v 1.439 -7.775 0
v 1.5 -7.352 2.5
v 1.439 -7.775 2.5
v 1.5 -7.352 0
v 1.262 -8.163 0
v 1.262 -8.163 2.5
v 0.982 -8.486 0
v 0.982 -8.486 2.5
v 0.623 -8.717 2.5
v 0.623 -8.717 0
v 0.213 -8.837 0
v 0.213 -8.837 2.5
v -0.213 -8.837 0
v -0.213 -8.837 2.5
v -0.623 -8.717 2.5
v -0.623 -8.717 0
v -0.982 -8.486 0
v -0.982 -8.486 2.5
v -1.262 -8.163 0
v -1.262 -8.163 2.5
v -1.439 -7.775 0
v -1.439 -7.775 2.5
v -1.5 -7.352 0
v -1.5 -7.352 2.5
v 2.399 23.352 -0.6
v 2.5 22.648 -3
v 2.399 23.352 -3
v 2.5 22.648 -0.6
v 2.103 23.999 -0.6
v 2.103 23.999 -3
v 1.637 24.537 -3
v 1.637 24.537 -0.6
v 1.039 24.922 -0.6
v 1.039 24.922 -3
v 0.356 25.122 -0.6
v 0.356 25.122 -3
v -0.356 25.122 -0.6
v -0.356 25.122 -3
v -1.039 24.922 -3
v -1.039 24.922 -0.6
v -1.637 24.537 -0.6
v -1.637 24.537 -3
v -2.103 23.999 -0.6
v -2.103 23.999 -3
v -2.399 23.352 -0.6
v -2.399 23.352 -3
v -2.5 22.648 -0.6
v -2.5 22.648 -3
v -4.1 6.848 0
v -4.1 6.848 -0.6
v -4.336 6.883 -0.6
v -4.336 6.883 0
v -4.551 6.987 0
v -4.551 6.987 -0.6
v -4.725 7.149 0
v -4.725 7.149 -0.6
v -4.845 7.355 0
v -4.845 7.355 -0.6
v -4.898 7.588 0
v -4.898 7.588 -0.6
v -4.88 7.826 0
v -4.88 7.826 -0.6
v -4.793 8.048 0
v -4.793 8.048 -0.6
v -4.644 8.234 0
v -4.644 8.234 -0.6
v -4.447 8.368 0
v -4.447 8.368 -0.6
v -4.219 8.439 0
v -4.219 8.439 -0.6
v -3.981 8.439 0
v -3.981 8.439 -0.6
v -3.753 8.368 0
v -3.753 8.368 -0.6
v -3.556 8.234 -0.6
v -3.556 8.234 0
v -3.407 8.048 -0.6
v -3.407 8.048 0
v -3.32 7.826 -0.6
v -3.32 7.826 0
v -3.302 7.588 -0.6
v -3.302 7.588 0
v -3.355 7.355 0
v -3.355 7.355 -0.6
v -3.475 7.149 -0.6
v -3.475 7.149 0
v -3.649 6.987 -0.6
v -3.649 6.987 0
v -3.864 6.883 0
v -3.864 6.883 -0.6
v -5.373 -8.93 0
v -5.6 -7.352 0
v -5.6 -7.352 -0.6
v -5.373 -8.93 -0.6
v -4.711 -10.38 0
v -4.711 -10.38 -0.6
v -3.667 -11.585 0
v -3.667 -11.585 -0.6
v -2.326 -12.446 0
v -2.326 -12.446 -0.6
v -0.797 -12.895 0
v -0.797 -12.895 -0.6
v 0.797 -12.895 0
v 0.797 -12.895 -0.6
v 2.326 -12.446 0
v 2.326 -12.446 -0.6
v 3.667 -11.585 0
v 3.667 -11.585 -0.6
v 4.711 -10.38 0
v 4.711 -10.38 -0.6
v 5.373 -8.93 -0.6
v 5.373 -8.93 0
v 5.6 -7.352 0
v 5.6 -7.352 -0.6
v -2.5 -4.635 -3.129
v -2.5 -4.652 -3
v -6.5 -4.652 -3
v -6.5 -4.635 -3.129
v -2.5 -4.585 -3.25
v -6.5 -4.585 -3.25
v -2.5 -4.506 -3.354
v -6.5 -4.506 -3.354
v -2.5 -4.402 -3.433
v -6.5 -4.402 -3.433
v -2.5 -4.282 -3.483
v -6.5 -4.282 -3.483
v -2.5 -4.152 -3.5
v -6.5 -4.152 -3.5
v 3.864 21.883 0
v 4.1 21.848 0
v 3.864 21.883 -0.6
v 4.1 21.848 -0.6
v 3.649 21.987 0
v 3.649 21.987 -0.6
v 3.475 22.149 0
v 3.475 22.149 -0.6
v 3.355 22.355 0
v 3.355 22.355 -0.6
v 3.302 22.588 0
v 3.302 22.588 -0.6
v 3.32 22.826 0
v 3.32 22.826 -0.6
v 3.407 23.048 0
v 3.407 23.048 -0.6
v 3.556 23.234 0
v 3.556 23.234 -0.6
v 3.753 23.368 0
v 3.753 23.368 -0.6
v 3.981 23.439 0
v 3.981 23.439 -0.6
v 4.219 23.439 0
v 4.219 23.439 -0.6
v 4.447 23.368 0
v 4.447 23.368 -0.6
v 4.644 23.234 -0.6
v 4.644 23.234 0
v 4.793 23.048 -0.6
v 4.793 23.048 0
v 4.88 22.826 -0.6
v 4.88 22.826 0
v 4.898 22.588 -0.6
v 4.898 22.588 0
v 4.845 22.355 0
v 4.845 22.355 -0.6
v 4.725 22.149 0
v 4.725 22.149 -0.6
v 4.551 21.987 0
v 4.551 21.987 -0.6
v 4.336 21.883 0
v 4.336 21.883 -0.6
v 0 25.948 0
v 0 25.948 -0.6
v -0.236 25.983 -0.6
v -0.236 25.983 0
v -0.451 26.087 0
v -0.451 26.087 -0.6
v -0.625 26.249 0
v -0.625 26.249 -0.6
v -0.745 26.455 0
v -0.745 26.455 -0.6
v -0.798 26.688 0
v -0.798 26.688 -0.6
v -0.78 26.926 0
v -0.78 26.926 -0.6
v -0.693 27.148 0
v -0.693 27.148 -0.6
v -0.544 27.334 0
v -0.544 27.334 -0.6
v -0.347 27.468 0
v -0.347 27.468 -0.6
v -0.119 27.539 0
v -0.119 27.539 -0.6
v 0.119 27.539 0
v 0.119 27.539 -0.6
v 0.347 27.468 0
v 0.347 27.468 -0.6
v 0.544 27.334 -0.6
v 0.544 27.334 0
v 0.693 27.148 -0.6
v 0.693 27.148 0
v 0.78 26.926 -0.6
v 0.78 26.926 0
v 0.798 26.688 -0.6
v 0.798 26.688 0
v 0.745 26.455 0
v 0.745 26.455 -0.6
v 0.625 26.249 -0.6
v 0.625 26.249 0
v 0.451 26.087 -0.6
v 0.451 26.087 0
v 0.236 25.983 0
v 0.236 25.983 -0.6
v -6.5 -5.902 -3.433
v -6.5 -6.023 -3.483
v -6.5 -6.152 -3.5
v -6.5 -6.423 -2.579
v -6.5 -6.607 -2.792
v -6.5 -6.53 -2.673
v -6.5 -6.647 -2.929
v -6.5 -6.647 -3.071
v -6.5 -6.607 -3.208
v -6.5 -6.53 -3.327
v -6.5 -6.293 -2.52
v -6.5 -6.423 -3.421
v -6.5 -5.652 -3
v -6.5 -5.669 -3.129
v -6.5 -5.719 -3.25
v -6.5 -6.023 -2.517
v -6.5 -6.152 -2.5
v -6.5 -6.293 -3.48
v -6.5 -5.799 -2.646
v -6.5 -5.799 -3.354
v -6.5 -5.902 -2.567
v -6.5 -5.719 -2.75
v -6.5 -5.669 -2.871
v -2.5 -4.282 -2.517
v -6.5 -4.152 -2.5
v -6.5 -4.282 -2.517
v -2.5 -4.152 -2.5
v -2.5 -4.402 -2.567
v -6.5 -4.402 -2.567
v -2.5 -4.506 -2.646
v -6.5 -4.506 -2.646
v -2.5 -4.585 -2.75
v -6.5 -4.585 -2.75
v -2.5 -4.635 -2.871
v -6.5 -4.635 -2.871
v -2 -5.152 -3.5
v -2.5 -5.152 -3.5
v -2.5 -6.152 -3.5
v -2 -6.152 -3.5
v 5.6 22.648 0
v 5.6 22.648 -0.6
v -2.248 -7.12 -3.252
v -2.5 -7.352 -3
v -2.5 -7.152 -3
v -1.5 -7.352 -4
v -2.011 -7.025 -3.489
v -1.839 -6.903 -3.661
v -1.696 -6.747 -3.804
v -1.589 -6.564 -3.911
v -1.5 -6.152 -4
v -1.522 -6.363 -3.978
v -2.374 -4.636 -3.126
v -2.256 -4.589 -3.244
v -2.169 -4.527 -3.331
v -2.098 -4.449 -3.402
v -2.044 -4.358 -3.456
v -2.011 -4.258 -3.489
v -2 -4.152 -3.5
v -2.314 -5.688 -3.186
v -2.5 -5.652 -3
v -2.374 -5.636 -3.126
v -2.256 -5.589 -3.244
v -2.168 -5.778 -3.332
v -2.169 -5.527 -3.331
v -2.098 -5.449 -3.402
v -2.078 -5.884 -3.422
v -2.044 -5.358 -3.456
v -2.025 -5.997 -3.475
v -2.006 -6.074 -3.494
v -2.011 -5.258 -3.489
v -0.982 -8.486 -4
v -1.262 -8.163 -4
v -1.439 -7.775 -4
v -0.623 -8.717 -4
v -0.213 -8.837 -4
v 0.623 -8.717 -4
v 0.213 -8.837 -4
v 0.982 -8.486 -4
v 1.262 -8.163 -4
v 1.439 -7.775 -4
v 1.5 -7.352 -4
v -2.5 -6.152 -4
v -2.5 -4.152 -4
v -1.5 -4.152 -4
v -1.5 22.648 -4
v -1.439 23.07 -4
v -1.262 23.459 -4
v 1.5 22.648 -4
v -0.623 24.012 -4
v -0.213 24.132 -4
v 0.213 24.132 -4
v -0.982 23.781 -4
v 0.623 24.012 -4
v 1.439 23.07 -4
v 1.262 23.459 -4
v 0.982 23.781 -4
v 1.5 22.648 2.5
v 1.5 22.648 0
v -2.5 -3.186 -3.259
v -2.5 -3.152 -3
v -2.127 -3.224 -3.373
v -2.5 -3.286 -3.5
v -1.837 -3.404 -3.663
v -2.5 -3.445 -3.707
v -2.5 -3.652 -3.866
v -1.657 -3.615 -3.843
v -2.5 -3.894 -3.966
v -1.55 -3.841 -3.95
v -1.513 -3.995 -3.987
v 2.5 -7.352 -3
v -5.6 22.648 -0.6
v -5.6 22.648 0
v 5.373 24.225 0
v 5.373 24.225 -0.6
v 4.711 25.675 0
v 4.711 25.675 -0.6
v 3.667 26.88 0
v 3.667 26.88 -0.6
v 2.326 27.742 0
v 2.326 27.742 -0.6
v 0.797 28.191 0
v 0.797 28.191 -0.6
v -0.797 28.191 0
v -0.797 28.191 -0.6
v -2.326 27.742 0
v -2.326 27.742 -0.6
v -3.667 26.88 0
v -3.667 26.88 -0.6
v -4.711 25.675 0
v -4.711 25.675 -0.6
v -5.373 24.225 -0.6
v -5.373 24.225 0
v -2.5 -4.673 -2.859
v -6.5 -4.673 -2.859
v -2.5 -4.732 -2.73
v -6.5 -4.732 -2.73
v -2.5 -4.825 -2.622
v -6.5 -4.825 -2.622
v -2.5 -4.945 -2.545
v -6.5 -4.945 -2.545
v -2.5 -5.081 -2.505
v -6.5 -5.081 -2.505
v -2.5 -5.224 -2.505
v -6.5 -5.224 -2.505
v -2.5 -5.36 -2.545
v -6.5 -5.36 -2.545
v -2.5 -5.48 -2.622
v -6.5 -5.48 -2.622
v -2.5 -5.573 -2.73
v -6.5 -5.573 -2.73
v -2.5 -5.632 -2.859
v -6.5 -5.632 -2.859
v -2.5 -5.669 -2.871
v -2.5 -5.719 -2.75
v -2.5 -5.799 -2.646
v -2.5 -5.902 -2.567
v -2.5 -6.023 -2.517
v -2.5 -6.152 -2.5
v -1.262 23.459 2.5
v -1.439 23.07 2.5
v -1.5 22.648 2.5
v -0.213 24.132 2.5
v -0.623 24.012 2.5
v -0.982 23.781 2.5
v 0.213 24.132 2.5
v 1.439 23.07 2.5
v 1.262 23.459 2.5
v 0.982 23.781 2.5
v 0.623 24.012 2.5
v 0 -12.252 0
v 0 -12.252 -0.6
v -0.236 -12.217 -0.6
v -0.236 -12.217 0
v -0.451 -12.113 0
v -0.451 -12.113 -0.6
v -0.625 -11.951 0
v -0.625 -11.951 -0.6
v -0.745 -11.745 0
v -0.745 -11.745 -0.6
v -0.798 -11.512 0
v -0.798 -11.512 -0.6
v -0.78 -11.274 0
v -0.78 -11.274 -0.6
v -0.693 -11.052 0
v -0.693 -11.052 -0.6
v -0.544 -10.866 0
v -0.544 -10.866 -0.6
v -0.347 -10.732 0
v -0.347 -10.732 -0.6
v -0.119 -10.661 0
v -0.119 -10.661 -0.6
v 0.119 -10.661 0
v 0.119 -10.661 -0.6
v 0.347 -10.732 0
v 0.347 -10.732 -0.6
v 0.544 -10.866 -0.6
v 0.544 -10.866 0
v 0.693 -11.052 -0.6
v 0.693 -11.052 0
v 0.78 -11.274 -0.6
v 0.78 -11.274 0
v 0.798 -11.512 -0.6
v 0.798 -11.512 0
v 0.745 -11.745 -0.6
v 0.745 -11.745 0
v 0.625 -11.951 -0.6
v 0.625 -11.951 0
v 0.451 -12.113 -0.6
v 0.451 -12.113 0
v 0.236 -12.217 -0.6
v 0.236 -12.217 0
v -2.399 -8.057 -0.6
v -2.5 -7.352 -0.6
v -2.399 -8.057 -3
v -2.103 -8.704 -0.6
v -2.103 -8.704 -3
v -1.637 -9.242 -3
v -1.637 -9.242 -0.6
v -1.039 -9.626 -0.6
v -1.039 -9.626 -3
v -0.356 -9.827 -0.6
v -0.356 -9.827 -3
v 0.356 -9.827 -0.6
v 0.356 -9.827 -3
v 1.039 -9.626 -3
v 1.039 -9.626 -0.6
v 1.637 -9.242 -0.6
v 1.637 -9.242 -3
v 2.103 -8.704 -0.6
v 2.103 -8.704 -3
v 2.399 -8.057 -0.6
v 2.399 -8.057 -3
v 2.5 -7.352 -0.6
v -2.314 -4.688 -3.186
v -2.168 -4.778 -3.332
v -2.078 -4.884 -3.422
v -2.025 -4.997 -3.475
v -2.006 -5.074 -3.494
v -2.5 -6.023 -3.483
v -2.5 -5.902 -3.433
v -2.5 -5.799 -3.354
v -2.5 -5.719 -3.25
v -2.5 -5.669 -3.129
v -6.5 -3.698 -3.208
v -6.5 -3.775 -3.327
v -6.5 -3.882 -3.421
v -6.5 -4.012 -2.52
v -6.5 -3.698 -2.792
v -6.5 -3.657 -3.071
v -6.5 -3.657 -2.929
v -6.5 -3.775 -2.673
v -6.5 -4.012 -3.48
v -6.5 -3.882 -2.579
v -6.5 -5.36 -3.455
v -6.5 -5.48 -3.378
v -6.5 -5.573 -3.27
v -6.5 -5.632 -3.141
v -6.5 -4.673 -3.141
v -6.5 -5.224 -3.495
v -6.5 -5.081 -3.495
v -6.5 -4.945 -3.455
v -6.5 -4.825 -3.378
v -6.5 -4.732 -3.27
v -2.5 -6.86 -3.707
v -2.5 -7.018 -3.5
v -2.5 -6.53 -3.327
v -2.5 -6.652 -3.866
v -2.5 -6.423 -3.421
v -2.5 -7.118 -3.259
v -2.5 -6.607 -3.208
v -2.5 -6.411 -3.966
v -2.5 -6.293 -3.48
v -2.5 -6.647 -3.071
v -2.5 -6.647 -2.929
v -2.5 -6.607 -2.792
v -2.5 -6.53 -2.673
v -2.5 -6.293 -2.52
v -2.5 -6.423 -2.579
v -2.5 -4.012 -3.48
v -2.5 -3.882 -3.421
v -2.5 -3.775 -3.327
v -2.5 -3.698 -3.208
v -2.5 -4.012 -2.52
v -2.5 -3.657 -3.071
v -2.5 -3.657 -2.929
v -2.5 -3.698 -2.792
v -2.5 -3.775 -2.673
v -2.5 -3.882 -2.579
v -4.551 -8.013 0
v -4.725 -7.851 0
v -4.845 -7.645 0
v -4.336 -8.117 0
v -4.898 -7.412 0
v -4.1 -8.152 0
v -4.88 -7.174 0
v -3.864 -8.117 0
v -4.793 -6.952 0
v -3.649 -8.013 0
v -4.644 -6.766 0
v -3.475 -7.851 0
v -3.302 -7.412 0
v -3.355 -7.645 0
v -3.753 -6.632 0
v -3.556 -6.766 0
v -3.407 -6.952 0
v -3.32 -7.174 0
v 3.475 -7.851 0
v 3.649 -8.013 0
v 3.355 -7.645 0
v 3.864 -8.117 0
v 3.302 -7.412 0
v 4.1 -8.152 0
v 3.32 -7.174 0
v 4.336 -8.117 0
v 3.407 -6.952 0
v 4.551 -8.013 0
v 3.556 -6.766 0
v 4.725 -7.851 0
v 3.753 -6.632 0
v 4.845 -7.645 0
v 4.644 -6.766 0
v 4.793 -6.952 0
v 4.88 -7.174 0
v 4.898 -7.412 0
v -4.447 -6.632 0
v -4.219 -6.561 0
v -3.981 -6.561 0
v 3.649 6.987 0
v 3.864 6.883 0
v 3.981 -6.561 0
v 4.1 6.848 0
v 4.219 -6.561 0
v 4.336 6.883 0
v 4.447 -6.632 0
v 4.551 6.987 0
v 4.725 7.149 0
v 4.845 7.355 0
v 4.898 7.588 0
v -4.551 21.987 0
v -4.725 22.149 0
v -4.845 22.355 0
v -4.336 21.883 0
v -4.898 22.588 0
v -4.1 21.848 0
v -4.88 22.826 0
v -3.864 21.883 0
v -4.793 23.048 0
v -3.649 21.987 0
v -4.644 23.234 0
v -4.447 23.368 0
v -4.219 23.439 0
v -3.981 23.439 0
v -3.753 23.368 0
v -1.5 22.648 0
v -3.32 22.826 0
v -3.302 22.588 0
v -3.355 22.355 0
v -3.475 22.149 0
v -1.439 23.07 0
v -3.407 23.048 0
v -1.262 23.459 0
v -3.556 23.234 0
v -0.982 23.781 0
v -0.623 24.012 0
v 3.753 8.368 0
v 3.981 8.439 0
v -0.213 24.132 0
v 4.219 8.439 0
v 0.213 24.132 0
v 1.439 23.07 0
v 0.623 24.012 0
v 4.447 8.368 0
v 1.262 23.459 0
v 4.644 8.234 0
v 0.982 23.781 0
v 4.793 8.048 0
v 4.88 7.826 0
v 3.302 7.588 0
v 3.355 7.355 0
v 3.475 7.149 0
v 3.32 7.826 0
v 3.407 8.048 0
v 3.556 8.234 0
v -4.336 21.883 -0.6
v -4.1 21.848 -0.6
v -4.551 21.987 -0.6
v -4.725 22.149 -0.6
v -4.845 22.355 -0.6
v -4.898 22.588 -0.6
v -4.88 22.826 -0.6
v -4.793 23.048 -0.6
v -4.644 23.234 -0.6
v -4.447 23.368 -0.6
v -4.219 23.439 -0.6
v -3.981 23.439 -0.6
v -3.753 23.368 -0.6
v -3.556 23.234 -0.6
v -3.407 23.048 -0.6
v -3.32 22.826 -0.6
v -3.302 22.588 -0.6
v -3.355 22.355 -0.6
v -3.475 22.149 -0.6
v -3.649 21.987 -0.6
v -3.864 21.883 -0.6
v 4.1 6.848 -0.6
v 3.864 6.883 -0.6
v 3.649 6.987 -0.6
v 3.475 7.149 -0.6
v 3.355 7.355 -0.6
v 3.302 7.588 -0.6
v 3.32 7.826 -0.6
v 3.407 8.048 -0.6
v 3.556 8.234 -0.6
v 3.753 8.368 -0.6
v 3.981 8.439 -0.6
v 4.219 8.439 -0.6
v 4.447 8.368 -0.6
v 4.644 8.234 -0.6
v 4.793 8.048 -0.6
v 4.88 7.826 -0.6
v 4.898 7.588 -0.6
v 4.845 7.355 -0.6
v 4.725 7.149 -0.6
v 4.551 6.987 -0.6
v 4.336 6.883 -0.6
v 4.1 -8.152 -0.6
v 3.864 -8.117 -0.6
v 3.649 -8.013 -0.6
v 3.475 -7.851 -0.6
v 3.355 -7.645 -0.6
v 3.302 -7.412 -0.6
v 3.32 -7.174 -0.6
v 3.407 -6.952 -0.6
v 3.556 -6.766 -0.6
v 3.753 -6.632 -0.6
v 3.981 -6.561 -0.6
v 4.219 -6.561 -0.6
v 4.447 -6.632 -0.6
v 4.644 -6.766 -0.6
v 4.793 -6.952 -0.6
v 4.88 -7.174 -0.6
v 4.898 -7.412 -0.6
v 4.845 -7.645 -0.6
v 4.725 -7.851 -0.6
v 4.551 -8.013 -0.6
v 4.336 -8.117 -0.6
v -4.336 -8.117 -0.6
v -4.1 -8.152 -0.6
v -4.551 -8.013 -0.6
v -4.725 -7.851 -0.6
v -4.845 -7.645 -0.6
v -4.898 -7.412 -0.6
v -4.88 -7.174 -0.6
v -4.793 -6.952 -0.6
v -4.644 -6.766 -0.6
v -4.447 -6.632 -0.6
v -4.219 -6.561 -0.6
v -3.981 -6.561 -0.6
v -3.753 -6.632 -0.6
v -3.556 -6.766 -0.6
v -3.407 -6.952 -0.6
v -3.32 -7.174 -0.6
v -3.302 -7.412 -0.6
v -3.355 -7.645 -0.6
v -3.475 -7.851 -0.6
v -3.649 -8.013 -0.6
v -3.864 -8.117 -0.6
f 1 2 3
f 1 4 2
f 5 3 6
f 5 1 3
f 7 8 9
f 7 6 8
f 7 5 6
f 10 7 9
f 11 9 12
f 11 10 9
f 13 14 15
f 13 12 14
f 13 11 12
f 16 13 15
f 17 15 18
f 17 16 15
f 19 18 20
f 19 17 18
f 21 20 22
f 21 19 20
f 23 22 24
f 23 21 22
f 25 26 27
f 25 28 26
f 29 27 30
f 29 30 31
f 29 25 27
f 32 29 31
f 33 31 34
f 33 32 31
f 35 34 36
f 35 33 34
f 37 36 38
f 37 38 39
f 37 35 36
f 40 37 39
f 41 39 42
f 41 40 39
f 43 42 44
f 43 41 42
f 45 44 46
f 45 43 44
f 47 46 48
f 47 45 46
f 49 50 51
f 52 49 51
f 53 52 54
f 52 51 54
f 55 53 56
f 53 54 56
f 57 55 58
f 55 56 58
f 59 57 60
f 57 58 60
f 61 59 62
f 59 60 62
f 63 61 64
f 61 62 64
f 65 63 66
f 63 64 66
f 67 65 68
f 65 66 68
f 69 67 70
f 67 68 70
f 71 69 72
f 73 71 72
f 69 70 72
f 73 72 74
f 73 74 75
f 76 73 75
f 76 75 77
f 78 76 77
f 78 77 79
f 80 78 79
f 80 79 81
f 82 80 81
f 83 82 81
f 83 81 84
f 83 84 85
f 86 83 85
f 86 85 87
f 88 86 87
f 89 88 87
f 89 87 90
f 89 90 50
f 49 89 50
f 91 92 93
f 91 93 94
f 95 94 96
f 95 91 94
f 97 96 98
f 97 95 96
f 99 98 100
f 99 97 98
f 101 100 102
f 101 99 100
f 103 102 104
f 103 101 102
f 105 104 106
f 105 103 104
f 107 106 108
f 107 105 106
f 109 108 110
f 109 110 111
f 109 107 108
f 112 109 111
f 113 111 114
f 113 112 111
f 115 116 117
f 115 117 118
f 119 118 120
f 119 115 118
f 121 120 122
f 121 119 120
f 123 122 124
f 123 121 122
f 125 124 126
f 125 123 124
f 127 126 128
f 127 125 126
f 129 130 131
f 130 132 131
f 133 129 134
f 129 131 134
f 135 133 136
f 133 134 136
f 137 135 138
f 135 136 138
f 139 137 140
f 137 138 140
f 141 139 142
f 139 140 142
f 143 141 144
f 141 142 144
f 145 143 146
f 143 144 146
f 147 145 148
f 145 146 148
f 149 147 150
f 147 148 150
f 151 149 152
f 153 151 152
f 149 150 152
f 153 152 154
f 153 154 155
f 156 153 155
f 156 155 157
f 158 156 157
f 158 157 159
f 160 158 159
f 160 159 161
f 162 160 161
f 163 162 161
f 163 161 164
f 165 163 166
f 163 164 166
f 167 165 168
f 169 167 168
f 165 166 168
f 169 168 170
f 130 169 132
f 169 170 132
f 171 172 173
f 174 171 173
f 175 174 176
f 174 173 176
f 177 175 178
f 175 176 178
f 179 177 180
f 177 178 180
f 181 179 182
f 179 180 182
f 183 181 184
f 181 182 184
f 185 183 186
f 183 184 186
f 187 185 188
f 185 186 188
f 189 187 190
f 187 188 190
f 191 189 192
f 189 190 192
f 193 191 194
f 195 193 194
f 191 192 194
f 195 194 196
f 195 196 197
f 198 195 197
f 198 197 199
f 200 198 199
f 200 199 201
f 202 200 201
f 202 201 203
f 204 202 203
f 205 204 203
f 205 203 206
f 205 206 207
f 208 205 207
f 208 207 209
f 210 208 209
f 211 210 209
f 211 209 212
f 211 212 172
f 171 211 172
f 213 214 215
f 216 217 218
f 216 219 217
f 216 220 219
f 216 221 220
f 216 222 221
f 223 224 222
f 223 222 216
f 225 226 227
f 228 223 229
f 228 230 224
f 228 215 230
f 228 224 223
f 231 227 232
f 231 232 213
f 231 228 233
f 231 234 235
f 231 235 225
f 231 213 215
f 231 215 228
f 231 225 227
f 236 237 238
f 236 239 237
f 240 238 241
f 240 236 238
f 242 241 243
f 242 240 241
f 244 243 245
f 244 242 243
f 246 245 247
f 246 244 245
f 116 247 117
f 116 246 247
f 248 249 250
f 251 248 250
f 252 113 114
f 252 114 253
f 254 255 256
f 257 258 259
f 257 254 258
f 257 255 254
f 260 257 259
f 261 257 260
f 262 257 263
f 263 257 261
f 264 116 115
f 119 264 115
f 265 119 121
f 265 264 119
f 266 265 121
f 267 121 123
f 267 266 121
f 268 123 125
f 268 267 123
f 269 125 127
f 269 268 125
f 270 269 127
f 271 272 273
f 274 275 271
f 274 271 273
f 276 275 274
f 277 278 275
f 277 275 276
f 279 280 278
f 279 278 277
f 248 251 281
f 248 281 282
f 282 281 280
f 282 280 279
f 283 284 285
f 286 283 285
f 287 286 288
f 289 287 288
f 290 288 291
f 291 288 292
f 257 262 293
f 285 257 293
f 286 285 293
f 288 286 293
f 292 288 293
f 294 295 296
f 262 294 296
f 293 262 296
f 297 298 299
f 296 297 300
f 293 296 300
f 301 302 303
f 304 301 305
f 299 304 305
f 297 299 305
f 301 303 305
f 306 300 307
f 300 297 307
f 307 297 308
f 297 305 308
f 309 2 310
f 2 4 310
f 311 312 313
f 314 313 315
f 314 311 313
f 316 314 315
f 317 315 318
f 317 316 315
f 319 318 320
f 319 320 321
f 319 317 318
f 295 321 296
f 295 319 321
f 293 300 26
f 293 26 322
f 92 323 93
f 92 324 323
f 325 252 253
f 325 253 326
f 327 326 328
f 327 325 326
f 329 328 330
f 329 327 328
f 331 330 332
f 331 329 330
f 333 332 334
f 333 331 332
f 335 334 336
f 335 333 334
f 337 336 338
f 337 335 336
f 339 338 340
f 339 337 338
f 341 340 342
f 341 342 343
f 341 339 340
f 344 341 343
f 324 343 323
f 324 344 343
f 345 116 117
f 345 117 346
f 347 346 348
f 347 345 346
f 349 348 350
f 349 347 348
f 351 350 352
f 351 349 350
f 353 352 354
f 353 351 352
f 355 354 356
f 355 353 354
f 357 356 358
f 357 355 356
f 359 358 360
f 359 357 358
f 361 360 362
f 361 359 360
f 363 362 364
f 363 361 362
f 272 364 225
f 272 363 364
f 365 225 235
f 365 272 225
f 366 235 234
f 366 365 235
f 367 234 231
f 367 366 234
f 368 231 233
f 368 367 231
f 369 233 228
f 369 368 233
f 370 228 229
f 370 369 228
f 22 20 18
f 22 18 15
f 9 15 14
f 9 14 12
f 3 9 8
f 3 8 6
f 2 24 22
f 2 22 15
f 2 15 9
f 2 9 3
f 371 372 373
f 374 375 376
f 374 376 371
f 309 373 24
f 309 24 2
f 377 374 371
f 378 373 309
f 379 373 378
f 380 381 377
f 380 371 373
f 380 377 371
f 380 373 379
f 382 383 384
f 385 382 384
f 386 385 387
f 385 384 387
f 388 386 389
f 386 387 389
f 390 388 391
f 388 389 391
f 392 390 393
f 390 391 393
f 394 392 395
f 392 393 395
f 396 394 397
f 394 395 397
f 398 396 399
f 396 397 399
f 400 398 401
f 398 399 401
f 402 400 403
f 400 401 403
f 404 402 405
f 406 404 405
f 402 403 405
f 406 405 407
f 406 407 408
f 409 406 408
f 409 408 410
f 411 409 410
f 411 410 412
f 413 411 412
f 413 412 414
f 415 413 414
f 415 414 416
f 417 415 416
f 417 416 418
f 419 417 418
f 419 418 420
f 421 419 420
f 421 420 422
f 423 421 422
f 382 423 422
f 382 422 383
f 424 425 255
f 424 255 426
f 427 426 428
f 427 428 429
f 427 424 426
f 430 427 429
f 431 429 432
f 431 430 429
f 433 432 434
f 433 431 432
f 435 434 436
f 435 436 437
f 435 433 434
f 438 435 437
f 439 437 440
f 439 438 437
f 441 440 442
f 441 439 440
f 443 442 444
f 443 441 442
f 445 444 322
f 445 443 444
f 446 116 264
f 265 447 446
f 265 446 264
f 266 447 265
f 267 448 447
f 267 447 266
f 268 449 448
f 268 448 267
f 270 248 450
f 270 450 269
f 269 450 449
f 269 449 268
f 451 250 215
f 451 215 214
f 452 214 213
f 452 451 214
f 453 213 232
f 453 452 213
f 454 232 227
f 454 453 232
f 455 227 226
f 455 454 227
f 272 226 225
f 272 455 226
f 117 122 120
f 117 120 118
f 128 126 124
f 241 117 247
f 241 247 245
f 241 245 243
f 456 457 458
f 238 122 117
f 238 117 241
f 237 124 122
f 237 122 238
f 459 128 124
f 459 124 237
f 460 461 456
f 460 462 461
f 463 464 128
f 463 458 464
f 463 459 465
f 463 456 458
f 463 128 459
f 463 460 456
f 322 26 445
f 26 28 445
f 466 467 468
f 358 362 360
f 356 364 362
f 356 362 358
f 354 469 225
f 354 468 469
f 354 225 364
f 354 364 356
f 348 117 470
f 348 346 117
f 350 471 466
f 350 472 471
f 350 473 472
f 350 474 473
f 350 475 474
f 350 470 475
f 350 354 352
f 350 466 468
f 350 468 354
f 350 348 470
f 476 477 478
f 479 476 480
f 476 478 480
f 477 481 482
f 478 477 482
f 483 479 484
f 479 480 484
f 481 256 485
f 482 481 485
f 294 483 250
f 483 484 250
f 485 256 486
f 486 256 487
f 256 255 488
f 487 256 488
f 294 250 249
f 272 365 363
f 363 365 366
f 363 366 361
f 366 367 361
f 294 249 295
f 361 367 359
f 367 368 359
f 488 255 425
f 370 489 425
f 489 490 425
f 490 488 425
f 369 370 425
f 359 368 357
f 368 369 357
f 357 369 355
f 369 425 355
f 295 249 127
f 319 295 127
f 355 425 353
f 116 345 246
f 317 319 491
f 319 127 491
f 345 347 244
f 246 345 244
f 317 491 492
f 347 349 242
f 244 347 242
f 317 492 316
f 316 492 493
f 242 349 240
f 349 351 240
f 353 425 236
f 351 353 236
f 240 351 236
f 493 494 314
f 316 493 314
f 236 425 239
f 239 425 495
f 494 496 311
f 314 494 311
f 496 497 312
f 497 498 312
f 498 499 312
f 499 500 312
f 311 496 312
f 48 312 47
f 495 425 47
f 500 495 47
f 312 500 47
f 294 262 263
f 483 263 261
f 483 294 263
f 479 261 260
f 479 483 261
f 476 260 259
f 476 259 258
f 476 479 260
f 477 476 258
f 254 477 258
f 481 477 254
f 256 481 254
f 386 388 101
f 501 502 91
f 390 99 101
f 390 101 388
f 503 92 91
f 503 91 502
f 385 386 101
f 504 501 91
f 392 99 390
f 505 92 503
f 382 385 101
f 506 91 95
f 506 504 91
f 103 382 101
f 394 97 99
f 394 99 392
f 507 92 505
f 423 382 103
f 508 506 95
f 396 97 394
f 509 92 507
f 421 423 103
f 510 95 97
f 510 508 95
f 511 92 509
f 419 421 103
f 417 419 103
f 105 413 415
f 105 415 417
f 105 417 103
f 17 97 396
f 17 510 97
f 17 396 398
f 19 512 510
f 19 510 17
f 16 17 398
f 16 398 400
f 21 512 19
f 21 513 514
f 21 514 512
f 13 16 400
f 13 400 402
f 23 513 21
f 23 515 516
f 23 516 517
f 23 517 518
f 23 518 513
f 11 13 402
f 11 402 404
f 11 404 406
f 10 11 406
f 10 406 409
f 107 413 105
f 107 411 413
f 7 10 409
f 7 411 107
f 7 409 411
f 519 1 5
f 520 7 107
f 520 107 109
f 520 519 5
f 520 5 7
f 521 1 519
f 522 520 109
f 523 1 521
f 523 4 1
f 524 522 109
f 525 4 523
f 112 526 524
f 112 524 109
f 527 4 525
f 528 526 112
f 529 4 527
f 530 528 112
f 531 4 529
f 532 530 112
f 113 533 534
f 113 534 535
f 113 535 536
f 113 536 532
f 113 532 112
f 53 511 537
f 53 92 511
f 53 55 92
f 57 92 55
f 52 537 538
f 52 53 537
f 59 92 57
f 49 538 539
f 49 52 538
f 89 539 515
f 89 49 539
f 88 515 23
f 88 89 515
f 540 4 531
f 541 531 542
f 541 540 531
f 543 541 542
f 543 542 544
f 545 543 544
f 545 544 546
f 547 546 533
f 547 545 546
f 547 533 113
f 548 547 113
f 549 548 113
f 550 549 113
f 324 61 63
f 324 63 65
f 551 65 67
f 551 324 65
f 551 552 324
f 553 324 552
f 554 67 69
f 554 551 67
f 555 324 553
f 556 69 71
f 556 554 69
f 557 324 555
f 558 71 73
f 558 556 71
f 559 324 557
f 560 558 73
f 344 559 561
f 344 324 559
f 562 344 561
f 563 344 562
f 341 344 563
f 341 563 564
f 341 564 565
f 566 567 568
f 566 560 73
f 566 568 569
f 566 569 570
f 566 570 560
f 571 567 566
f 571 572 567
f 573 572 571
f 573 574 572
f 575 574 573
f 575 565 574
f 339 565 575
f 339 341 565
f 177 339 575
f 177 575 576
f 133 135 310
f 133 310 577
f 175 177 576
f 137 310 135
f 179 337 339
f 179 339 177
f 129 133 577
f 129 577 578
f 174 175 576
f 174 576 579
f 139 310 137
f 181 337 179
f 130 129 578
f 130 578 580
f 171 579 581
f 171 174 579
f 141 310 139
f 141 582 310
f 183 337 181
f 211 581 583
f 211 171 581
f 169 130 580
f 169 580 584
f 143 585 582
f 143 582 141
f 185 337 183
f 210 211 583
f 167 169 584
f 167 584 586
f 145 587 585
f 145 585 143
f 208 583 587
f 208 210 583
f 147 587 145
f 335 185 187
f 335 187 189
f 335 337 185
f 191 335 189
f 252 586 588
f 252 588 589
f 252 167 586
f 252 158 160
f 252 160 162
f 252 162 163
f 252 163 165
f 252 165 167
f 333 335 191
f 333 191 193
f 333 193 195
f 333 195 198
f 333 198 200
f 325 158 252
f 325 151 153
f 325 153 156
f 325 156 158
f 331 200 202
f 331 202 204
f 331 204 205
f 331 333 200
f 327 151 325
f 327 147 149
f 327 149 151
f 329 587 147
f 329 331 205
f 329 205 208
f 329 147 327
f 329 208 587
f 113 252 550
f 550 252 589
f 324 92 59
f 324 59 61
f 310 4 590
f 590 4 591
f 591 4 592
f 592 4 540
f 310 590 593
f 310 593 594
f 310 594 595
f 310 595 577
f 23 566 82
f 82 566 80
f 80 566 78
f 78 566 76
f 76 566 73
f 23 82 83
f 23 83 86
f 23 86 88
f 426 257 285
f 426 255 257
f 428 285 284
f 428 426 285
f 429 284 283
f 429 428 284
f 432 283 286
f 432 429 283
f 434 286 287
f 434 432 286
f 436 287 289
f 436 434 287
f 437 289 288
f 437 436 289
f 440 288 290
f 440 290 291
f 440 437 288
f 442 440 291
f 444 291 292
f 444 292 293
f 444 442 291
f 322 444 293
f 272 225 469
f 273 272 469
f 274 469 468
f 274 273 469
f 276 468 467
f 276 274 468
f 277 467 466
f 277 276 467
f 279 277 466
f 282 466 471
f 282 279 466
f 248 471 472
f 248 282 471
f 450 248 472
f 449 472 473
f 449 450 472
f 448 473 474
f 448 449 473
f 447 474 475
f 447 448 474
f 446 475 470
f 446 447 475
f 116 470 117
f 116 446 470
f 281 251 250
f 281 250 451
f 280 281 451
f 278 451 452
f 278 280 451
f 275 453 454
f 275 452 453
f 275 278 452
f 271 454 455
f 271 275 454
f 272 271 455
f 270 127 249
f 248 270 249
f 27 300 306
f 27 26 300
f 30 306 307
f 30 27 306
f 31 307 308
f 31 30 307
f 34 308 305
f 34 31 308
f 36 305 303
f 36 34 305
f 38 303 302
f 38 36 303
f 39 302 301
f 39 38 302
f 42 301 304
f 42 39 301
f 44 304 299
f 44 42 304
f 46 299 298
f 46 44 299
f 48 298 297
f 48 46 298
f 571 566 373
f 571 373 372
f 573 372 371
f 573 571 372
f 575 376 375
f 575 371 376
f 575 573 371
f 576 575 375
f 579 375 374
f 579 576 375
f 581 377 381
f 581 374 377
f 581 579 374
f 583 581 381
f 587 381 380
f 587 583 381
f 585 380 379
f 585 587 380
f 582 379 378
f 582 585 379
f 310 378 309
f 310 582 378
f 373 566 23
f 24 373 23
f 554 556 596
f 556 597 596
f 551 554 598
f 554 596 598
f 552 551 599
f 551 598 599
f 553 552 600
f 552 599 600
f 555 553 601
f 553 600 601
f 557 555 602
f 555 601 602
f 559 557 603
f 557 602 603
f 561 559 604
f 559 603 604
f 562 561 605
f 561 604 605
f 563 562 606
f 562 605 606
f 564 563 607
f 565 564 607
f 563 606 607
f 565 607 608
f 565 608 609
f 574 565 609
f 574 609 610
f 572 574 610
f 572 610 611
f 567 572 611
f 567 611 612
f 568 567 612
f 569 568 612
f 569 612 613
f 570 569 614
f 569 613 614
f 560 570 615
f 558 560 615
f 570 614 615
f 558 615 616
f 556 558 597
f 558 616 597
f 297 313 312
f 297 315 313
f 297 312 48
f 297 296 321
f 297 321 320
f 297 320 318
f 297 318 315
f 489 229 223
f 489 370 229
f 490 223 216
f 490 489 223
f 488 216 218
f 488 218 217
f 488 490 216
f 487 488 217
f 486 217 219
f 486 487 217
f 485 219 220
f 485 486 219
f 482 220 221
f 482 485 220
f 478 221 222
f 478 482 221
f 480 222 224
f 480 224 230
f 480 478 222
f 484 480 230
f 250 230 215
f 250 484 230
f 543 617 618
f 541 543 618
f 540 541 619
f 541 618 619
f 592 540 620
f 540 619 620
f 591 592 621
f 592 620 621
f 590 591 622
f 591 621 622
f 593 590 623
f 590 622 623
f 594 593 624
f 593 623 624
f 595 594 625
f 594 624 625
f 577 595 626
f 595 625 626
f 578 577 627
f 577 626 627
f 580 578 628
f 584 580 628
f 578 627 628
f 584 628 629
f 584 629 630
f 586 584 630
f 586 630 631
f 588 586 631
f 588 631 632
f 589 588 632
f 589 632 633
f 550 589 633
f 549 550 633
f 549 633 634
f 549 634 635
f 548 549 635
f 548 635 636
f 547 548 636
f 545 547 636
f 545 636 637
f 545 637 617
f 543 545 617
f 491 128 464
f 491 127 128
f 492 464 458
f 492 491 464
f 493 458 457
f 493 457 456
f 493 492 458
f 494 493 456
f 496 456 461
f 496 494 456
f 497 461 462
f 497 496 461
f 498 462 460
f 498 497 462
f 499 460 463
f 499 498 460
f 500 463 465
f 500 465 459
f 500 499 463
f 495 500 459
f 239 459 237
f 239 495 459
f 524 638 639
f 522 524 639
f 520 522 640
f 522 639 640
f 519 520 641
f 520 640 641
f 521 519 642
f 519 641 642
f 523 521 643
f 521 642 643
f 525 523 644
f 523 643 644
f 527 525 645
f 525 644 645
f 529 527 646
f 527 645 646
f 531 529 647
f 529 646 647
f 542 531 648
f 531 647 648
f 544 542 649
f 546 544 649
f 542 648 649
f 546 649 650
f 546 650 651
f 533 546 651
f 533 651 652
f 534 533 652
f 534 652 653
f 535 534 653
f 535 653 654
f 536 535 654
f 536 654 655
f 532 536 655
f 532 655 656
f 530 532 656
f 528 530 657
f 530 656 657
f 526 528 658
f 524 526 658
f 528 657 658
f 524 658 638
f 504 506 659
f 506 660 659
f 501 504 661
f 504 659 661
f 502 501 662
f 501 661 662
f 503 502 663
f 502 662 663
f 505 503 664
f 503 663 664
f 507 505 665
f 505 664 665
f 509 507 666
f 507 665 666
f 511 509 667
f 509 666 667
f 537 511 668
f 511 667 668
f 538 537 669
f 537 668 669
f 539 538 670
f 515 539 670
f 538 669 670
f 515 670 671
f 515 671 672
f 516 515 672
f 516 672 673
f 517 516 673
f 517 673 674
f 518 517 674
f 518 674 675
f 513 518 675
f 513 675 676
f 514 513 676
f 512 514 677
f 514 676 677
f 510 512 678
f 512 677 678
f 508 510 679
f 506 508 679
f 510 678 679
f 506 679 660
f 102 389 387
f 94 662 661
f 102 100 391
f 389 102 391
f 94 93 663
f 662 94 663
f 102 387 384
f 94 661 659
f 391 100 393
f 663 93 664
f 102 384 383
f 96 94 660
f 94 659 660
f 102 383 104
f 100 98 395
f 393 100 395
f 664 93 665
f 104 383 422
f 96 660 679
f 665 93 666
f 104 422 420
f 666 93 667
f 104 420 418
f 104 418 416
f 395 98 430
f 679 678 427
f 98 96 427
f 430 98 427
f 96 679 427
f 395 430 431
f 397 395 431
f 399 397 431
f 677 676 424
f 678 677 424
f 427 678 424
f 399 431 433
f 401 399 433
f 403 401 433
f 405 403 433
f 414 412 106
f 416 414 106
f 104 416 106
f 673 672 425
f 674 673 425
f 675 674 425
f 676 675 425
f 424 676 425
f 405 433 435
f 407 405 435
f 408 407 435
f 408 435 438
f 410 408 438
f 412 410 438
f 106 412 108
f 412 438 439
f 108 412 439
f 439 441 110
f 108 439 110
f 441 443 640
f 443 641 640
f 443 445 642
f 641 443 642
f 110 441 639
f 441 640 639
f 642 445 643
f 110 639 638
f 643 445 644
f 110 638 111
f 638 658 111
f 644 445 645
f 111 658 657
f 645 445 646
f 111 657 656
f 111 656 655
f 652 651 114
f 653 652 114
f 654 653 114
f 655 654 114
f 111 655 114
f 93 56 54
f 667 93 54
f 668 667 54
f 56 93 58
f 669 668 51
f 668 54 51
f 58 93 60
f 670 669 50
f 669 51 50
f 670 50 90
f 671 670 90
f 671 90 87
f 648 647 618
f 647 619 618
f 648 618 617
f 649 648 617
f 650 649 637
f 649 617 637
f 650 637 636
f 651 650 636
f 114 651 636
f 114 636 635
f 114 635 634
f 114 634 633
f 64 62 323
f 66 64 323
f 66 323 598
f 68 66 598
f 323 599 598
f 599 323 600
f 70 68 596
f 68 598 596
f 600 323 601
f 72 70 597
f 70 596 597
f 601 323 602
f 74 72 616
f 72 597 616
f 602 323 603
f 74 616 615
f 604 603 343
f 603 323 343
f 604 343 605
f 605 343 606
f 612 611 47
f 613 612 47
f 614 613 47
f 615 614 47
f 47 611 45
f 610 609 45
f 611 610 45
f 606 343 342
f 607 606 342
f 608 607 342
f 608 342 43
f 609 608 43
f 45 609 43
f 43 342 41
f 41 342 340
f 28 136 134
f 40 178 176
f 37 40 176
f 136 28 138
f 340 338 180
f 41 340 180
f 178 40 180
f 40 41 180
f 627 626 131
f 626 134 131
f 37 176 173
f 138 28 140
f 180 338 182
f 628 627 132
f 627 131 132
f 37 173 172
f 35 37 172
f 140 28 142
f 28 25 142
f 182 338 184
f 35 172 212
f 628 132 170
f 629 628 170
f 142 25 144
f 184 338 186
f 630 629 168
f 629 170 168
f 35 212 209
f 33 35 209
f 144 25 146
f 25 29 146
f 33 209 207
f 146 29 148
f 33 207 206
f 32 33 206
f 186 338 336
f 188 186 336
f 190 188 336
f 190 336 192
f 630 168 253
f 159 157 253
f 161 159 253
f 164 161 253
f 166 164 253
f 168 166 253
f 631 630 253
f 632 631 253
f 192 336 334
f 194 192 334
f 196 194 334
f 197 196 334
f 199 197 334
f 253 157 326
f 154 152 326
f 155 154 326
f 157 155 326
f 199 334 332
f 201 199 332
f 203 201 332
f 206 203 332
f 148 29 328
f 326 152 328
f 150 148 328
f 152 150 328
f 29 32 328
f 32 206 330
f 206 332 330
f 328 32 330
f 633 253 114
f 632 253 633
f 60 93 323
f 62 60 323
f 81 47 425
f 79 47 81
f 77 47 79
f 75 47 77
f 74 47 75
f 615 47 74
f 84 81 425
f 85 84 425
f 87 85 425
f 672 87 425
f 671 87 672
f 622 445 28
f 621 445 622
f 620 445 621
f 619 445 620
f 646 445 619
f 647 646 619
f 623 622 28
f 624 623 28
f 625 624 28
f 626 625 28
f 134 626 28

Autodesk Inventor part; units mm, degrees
ref_plane "YZ Plane" through (0, 0, 0) normal (1, 0, 0) x (0, 1, 0)
ref_plane "XZ Plane" through (0, 0, 0) normal (0, 1, 0) x (-1, 0, 0)
ref_plane "XY Plane" through (0, 0, 0) normal (0, 0, 1) x (1, 0, 0)
sketch "Sketch1" plane through (0, 0, 0) normal (0, 0, 1) x (1, 0, 0)
  line L0 (0, -7.3524) -> (0, 22.6476) construction
  line L1 (1.5, -7.3524) -> (1.5, 22.6476)
  line L2 (-1.5, 22.6476) -> (-1.5, -7.3524)
  arc A0 (-1.5, -7.3524) -> (1.5, -7.3524) centre (0, -7.3524) ccw
  arc A1 (1.5, 22.6476) -> (-1.5, 22.6476) centre (0, 22.6476) ccw
  line L3 (-2.5, -7.3524) -> (-2.5, 22.6476)
  arc A2 (2.5, 22.6476) -> (-2.5, 22.6476) centre (0, 22.6476) ccw
  line L4 (2.5, 22.6476) -> (2.5, -7.3524)
  arc A3 (-2.5, -7.3524) -> (2.5, -7.3524) centre (0, -7.3524) ccw
  line L5 (-5.6, 22.6476) -> (-5.6, -7.3524)
  arc A4 (-5.6, -7.3524) -> (5.6, -7.3524) centre (0, -7.3524) ccw
  line L6 (5.6, -7.3524) -> (5.6, 22.6476)
  arc A5 (5.6, 22.6476) -> (-5.6, 22.6476) centre (0, 22.6476) ccw
  line L7 (-4.1, 22.6476) -> (-4.1, -7.3524)
  arc A6 (-4.1, -7.3524) -> (4.1, -7.3524) centre (0, -7.3524) ccw
  line L8 (4.1, -7.3524) -> (4.1, 22.6476)
  arc A7 (4.1, 22.6476) -> (-4.1, 22.6476) centre (0, 22.6476) ccw
  point P0 (0, 0)
  point P1 (0, 7.6476)
  point P2 (0, 26.7476)
  point P3 (0, -11.4524)
  point P4 (-4.1, 7.6476)
  point P5 (-4.1, 22.6476)
  point P6 (4.1, 7.6476)
  point P7 (-4.1, 7.6476)
  dimension "d0" = 30
  dimension "d1" = 3
  dimension "d2" = 1
  dimension "d3" = 3.1
  dimension "d10" = 1.6
  dimension "d16" = 15
extrude "Extrusion1" add sketch "Sketch1" along normal blind 2.5 contours A0 L2 A1 L1
extrude "Extrusion2" add sketch "Sketch1" against normal blind 0.6 contours A5 L6 A4 L5 | A7 L8 A6 L7
extrude "Extrusion3" add sketch "Sketch1" against normal blind 4 contours A0 L2 A1 L1 | L3 A2 L4 A3
hole "Hole1" at (0, 26.7476, 0) at (0, -11.4524, 0) at (-4.1, -7.3524, 0) at (-4.1, 7.6476, 0) at (-4.1, 22.6476, 0) at (4.1, -7.3524, 0) at (4.1, 7.6476, 0) at (4.1, 22.6476, 0) direction (0, 0, -1) diameter 1.6 end through all both
chamfer "Chamfer1" distance 1 angle 45 4 edges at (0, -9.8524, -4) (-2.5, 7.6476, -4) (0, 25.1476, -4) (2.5, 7.6476, -4)
sketch "Sketch2" plane through (-2.5, -7.3524, -0.6) normal (-1, 0, 0) x (0, 0, 1)
  line L0 (-2.4, 0) -> (-2.4, 30) projected
  line L1 (0, 0) -> (-2.4, 0) projected
  line L2 (0, 30) -> (0, 0) projected
  line L3 (0, 30) -> (-2.4, 30) projected
  line L4 (-2.4, 30) -> (-2.4, 0) projected
  line L5 (-2.4, 1.2) -> (-2.4, 3.2) construction
  line L6 (-1.9, 1.2) -> (-1.9, 3.2)
  line L7 (-2.9, 3.2) -> (-2.9, 1.2)
  arc A0 (-2.9, 1.2) -> (-1.9, 1.2) centre (-2.4, 1.2) ccw
  arc A1 (-1.9, 3.2) -> (-2.9, 3.2) centre (-2.4, 3.2) ccw
  line L8 (-1.4, 1.2) -> (-1.4, 3.2)
  arc A2 (-1.4, 3.2) -> (-3.4, 3.2) centre (-2.4, 3.2) ccw
  line L9 (-3.4, 3.2) -> (-3.4, 1.2)
  arc A3 (-3.4, 1.2) -> (-1.4, 1.2) centre (-2.4, 1.2) ccw
  circle A4 centre (-2.4, 1.2) radius 0.5
  circle A5 centre (-2.4, 3.2) radius 0.5
  circle A6 centre (-2.4, 2.2) radius 0.5
  point P0 (0.6, 7.3524)
  dimension "d31" = 2
  dimension "d32" = 1
  dimension "d33" = 1.2
  dimension "d34" = 0.5
extrude "Extrusion5" add sketch "Sketch2" against normal blind 1 contours A3 L9 A2 L0 A1 L7 A0 | L0 A0 L6 A1 A2 L8 A3
extrude "Extrusion6" add sketch "Sketch2" along normal mid plane 8 contours A0 A4 L0 | L0 A4 A0 | A6 L0 | L0 A6 | A5 A1 L0 | L0 A1 A5
properties part number "ASSEMBLY_Regolith_level_sensor" material "Aluminum 6061"
